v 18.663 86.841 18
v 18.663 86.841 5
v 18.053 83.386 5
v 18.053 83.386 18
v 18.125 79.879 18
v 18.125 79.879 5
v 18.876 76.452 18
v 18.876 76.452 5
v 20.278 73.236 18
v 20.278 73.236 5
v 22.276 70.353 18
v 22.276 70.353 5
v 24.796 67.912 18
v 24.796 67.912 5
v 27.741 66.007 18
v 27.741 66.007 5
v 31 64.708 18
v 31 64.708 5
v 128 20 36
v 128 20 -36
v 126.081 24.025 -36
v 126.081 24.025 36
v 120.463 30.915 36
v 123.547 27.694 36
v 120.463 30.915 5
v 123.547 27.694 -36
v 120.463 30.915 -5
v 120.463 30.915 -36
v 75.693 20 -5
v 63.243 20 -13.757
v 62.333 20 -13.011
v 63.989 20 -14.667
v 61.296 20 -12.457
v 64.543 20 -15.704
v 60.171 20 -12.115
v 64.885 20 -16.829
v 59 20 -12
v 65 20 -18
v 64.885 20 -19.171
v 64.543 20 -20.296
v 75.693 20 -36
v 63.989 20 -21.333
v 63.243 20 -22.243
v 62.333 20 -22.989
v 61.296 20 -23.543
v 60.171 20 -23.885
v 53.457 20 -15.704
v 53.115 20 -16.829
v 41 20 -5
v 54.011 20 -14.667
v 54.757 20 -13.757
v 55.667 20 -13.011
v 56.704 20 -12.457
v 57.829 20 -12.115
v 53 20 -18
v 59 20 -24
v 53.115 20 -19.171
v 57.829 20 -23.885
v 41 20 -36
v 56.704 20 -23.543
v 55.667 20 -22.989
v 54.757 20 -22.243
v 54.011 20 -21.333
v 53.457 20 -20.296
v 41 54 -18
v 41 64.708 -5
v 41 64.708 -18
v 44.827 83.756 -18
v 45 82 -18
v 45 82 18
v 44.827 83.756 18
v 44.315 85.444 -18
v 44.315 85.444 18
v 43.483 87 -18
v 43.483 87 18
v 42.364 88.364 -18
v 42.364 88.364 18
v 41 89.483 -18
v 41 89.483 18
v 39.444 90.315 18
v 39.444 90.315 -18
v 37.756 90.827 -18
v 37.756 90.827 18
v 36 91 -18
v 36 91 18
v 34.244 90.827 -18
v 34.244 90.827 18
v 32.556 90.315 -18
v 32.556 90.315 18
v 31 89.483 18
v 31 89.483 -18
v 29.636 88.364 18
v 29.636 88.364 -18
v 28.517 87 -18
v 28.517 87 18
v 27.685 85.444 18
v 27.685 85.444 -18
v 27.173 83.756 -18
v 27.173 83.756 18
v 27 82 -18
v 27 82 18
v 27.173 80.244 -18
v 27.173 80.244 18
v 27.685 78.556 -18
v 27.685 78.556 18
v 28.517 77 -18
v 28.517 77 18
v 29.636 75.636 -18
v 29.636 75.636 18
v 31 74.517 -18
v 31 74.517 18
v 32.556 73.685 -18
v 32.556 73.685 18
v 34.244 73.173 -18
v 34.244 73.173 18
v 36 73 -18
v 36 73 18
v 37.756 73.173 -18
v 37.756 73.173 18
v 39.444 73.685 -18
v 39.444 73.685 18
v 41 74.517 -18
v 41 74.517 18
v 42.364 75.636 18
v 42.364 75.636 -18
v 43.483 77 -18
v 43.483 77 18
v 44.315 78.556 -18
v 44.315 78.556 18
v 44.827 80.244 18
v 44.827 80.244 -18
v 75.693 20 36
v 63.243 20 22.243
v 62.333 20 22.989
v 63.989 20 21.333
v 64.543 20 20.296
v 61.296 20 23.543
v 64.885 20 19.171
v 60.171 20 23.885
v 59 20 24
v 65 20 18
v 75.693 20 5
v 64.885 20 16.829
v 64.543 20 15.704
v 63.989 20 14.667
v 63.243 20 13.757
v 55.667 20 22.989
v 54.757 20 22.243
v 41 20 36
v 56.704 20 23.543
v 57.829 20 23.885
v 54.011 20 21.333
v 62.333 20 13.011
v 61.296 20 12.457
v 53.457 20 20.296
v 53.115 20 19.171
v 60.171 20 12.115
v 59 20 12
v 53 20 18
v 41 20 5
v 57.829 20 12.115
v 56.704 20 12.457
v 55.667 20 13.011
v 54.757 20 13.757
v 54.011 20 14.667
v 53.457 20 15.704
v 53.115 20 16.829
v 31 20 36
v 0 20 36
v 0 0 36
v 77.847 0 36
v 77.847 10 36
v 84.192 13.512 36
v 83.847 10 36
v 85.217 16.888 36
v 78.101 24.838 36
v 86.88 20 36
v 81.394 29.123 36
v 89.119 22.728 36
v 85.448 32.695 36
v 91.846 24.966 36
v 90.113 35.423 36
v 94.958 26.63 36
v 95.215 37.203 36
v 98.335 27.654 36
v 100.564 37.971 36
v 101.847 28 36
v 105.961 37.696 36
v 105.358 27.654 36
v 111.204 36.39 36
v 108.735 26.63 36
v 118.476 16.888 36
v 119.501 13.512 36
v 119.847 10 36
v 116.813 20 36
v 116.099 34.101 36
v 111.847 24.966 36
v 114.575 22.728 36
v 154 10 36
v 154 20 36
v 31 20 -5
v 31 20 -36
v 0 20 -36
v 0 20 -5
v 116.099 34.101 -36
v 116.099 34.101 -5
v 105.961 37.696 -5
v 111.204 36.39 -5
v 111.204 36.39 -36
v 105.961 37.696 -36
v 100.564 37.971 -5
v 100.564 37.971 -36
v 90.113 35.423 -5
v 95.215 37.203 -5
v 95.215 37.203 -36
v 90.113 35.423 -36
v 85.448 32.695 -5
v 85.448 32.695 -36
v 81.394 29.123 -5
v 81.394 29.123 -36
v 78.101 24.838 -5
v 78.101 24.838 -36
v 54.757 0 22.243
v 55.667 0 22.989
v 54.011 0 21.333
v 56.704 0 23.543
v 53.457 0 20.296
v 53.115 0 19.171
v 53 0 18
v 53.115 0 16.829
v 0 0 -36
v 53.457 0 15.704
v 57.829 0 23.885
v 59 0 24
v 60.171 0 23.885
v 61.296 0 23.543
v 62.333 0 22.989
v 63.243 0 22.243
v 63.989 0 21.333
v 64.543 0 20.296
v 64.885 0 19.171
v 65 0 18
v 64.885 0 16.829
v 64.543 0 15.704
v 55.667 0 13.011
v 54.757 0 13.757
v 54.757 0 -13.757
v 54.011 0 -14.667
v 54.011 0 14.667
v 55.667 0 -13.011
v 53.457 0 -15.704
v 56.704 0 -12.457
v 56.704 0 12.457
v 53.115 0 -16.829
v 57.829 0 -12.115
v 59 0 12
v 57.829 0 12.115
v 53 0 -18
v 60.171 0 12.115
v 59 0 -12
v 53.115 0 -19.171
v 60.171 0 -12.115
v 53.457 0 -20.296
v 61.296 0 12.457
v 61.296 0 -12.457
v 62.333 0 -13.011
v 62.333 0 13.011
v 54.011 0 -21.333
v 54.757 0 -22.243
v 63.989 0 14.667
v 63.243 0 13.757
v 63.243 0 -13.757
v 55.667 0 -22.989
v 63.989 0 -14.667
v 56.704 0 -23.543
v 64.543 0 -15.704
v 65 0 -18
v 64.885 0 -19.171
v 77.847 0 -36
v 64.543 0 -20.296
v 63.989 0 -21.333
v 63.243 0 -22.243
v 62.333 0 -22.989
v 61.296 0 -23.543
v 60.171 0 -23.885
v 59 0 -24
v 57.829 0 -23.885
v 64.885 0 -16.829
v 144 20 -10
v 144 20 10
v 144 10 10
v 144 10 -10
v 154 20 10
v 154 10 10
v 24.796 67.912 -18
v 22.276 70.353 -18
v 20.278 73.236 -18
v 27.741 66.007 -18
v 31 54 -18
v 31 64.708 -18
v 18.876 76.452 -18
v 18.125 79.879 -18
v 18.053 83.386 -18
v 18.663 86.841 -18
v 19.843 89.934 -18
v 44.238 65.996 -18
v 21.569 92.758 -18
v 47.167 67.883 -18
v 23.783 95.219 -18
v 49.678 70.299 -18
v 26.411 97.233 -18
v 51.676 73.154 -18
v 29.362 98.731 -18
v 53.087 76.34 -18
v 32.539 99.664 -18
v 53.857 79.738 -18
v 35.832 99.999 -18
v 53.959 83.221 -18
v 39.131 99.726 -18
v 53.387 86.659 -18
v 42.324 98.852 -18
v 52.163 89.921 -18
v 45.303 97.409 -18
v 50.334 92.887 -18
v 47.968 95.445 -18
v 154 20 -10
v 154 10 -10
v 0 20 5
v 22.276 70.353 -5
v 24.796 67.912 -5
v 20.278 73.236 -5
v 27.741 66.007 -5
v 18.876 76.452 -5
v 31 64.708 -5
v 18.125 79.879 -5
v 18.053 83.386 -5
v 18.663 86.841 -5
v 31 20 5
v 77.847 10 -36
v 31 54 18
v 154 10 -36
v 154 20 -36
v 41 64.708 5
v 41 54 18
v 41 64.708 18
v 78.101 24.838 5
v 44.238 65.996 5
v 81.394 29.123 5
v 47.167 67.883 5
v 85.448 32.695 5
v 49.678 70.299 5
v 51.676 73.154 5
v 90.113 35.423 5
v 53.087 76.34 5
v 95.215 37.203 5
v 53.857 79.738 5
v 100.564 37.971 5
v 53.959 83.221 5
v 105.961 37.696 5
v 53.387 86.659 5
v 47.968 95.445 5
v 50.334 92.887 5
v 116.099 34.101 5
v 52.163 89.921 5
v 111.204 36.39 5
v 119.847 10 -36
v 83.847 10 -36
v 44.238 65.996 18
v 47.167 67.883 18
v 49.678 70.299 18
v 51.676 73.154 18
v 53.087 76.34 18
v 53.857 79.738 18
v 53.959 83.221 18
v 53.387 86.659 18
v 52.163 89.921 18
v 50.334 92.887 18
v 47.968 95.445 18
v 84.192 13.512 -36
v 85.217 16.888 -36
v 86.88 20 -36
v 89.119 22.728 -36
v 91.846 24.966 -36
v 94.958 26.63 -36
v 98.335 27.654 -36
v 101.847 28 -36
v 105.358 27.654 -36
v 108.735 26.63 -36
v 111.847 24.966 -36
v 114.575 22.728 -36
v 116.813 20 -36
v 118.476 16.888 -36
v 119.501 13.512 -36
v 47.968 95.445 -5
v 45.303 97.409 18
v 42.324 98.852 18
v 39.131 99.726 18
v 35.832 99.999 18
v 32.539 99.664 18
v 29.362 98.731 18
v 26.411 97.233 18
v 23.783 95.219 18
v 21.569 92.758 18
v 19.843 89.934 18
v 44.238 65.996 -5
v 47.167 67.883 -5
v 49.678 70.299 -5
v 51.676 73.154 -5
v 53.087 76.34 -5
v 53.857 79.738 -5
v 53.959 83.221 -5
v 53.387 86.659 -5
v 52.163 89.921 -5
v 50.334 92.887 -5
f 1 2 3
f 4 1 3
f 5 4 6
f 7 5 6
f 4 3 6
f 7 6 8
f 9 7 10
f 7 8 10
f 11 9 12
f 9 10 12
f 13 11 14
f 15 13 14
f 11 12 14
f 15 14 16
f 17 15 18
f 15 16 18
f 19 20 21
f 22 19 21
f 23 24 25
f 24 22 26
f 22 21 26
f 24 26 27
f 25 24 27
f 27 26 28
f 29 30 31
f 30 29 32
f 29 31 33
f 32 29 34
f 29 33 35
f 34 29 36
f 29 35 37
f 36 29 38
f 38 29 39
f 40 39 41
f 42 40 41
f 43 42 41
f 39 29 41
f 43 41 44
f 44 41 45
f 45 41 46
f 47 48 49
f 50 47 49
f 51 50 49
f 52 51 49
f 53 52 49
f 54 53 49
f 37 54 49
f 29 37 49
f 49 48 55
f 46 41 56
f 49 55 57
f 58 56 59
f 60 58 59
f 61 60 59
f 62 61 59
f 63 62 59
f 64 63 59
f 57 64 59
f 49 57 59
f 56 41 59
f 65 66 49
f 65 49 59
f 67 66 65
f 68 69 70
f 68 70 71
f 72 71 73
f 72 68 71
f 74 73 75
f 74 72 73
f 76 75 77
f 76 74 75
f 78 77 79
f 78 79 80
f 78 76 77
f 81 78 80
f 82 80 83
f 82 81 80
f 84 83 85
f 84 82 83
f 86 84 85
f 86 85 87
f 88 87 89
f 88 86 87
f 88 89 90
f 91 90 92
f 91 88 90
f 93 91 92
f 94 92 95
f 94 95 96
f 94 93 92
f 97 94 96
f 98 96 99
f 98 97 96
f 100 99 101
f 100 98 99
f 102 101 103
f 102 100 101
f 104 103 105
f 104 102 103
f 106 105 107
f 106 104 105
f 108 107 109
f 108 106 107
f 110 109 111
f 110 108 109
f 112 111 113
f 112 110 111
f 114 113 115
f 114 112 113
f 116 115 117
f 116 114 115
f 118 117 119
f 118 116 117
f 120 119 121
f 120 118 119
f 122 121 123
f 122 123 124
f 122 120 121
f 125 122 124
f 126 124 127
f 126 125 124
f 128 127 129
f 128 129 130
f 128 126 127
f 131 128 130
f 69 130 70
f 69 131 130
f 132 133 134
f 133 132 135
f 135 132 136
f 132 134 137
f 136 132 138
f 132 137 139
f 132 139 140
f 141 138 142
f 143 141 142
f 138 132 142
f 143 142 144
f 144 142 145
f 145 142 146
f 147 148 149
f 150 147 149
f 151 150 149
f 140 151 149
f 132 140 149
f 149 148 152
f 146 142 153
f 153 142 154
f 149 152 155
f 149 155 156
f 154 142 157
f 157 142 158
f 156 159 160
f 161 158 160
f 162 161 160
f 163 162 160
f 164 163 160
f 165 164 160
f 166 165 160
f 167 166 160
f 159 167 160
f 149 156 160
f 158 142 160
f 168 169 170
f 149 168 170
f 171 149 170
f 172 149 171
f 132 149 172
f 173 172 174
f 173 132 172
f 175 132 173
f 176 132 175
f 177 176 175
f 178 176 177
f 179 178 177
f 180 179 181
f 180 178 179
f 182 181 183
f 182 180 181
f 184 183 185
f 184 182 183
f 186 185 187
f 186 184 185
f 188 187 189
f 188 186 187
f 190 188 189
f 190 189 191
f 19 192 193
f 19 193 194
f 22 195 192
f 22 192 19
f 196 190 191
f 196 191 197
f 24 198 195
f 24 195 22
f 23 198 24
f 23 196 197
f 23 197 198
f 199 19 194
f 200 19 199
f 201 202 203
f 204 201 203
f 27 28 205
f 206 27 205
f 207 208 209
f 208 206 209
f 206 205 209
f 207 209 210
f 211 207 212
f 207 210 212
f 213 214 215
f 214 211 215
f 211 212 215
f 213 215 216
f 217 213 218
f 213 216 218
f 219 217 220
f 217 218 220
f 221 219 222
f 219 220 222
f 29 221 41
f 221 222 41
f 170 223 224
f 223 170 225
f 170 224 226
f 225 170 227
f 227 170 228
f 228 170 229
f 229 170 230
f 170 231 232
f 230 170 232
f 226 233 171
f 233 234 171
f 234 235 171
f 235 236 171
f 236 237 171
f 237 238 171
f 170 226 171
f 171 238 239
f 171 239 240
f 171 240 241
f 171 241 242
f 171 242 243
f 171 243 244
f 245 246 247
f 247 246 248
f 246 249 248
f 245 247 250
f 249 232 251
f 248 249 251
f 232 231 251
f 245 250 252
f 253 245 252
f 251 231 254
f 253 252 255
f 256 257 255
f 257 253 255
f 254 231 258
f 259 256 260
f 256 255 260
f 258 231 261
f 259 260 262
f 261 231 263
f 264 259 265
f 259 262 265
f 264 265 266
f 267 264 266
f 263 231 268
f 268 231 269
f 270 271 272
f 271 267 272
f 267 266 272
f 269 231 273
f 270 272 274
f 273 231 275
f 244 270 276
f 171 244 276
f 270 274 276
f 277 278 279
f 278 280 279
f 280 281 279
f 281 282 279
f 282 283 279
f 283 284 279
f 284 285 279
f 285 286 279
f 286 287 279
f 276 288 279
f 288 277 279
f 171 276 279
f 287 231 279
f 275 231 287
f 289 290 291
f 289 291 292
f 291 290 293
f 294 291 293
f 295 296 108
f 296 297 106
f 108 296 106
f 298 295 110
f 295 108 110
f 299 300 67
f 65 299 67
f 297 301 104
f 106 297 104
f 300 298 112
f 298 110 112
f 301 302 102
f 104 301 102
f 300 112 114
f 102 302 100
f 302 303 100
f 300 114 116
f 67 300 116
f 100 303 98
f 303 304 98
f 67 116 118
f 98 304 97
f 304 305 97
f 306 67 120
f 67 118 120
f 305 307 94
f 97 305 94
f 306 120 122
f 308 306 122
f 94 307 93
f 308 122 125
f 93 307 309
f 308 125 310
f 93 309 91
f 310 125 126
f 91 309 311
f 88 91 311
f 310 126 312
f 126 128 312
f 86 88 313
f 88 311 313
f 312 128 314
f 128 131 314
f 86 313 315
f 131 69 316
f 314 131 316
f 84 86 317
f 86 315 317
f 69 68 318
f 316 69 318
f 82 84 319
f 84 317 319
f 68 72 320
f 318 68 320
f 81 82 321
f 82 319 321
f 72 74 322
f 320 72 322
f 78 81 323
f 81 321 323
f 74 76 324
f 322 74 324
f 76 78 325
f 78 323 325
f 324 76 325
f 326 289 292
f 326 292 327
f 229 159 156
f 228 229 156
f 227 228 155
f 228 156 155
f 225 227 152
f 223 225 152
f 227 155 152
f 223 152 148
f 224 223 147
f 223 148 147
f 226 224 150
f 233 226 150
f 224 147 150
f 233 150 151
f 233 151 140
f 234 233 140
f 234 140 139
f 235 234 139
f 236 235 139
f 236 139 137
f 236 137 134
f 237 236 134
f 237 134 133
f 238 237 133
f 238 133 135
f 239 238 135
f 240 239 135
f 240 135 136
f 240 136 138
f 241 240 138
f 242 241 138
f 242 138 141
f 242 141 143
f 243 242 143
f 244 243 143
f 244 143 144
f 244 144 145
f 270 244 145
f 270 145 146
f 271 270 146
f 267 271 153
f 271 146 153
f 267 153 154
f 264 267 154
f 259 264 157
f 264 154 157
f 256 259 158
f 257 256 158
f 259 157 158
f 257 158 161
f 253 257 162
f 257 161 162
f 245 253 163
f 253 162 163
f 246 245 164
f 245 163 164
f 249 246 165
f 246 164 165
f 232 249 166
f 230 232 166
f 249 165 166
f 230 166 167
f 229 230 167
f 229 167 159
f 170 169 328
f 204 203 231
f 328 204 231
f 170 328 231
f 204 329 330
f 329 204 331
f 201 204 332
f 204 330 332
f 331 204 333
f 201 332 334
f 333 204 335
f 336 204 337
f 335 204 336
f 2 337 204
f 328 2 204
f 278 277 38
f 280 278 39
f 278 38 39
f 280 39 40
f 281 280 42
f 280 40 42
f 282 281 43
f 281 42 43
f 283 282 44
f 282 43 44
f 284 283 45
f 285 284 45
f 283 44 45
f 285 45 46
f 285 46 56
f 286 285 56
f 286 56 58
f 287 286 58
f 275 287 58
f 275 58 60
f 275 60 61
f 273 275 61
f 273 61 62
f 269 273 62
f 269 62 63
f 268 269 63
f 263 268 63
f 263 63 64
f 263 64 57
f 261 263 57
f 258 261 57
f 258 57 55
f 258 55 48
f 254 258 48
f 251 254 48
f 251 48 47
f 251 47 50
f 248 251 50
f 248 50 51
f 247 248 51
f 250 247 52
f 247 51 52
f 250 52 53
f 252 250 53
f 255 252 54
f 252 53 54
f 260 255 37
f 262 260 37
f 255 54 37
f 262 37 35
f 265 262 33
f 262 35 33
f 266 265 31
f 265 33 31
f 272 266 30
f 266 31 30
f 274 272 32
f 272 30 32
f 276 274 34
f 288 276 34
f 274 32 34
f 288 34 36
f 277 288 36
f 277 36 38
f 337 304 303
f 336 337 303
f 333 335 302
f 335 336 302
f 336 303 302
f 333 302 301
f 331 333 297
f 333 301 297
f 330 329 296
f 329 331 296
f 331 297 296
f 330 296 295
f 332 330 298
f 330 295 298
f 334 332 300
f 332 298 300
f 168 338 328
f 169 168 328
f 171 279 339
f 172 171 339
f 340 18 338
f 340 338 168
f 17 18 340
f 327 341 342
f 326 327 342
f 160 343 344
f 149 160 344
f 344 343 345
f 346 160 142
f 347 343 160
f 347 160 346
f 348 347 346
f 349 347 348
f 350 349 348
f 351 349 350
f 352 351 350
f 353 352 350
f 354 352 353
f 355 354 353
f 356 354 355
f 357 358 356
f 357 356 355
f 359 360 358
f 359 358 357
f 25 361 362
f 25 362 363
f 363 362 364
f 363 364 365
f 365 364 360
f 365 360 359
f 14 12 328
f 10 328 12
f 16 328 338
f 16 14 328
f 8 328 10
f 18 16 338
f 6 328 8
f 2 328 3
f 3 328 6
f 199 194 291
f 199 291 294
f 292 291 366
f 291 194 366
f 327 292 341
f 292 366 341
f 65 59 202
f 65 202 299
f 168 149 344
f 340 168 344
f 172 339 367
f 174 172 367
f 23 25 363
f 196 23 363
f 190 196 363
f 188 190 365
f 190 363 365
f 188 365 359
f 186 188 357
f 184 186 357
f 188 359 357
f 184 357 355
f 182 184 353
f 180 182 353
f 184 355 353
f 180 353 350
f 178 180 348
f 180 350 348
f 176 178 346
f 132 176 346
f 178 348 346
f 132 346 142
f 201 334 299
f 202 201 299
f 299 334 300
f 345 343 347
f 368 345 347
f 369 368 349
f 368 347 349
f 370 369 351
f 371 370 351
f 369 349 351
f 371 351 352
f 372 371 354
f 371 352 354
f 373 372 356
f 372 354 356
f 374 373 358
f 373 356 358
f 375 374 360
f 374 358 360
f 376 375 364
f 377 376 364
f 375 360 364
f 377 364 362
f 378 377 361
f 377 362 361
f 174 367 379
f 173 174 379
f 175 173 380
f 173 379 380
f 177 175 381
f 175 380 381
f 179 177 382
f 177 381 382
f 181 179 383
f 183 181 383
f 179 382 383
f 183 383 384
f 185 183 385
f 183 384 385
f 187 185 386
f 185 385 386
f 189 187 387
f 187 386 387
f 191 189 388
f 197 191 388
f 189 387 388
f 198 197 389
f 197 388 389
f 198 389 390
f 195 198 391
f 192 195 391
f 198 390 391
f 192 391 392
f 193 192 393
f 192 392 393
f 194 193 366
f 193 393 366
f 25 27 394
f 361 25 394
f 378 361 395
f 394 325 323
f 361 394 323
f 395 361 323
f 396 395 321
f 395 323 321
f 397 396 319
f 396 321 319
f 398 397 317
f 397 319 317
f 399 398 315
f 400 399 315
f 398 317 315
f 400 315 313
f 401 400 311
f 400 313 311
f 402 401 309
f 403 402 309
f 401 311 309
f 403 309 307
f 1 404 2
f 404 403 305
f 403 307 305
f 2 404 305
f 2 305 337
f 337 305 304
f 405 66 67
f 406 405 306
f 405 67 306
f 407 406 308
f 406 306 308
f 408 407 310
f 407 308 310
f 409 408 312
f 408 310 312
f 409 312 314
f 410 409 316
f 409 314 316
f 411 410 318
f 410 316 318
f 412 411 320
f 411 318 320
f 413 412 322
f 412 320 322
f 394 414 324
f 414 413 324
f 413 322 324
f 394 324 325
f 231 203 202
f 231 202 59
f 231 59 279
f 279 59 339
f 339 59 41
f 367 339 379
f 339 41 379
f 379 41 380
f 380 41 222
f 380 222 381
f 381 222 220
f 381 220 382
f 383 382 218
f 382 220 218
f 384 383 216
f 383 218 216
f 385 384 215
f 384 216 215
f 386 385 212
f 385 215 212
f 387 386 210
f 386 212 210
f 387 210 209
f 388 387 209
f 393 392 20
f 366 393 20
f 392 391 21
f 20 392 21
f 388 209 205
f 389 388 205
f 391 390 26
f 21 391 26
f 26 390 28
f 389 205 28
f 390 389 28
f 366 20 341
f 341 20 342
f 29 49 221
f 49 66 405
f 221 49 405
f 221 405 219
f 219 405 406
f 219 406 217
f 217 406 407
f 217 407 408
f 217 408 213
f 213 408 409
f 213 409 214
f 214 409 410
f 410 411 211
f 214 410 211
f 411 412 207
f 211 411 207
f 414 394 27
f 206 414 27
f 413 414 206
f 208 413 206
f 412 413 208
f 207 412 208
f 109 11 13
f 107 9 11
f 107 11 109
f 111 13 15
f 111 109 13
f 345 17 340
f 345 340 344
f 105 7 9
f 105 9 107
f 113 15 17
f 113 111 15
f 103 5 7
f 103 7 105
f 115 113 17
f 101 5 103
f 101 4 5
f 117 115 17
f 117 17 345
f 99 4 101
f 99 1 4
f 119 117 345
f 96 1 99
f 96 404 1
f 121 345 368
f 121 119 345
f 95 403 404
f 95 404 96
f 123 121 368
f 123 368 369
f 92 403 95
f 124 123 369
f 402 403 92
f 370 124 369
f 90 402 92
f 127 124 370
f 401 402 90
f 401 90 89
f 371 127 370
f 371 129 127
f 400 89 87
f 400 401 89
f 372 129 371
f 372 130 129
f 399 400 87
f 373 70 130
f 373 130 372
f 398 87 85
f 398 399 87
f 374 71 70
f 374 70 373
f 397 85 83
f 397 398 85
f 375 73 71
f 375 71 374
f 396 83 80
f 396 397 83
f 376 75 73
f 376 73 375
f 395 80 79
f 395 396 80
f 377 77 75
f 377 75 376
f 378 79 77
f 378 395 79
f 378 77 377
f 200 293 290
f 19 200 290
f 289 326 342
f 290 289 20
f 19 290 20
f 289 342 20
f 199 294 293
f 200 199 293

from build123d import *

# Parameters (mm, degrees)
BOSS_EXTRUDE1_DEPTH      = 36
BOSS_EXTRUDE1_DEPTH_BACK = 36
BOSS_EXTRUDE2_DEPTH      = 18
BOSS_EXTRUDE2_DEPTH_BACK = 18
SKETCH2_3_R              = 9
BOSS_EXTRUDE3_DEPTH      = 5
BOSS_EXTRUDE3_DEPTH_BACK = 5
SKETCH2_4_W              = 5
SKETCH2_4_H              = 34
SKETCH3_W                = 10
SKETCH3_H                = 20
CUT_EXTRUDE1_DEPTH       = 178.234308191
RIB1_START               = -5
RIB1_DEPTH               = 10
SKETCH5_R                = 6
CUT_EXTRUDE2_DEPTH       = 178.234308191


# Read off the part's stored shape, not the designer's step: Rib1
with BuildPart() as part:
    # Sketch2 → Boss-Extrude1 (new, two sides: drawn at the far end of the back side and taken through both)
    with BuildSketch(Plane.XY.offset(-BOSS_EXTRUDE1_DEPTH_BACK)):
        with BuildLine():
            Line((0, 20), (0, 0))
            Line((0, 0), (77.846606339, 0))
            Line((77.846606339, 0), (77.846606339, 10))
            Line((77.846606339, 10), (83.846606339, 10))
            ThreePointArc((83.846606339, 10), (101.846606339, 28), (119.846606339, 10))
            Line((119.846606339, 10), (154, 10))
            Line((154, 10), (154, 20))
            Line((154, 20), (128, 20))
            ThreePointArc((128, 20), (124.887273582, 25.909985951), (120.463315732, 30.914543538))
            ThreePointArc((120.463315732, 30.914543538), (95.214697292, 37.203267863), (75.693212678, 20))
            Line((75.693212678, 20), (41, 20))
            Line((41, 20), (31, 20))
            Line((31, 20), (0, 20))
        make_face()
    extrude(amount=BOSS_EXTRUDE1_DEPTH + BOSS_EXTRUDE1_DEPTH_BACK)



with BuildPart() as body_2:
    # Sketch2<3> → Boss-Extrude2 (new, two sides: drawn at the far end of the back side and taken through both)
    with BuildSketch(Plane.XY.offset(-BOSS_EXTRUDE2_DEPTH_BACK)):
        with BuildLine():
            ThreePointArc((47.96788461, 95.445063703), (30.929004292, 99.270929405), (18.663131241, 86.840762505))
            ThreePointArc((18.663131241, 86.840762505), (20.277580459, 73.236123929), (31, 64.708383534))
            Line((31, 64.708383534), (31, 54))
            Line((31, 54), (41, 54))
            Line((41, 54), (41, 64.708383534))
            ThreePointArc((41, 64.708383534), (53.55457644, 78.020446505), (47.96788461, 95.445063703))
        make_face()
        with Locations((36, 82)):
            Circle(SKETCH2_3_R, mode=Mode.SUBTRACT)
    extrude(amount=BOSS_EXTRUDE2_DEPTH + BOSS_EXTRUDE2_DEPTH_BACK)


with BuildPart() as part_1:
    add(part.part)

    add(body_2.part)  # Boss-Extrude3 merges body 2
    # Sketch2<4> → Boss-Extrude3 (add, two sides: drawn at the far end of the back side and taken through both)
    with BuildSketch(Plane.XY.offset(-BOSS_EXTRUDE3_DEPTH_BACK)):
        with BuildLine():
            Line((120.463315732, 30.914543538), (47.96788461, 95.445063703))
            ThreePointArc((47.96788461, 95.445063703), (53.55457644, 78.020446505), (41, 64.708383534))
            Line((41, 64.708383534), (41, 54))
            Line((41, 54), (41, 20))
            Line((41, 20), (75.693212678, 20))
            ThreePointArc((75.693212678, 20), (95.214697292, 37.203267863), (120.463315732, 30.914543538))
        make_face()
        with Locations((33.5, 37)):
            Rectangle(SKETCH2_4_W, SKETCH2_4_H)
        with Locations((38.5, 37)):
            Rectangle(SKETCH2_4_W, SKETCH2_4_H)
        with BuildLine():
            Line((18.663131241, 86.840762505), (0, 20))
            Line((0, 20), (31, 20))
            Line((31, 20), (31, 54))
            Line((31, 54), (31, 64.708383534))
            ThreePointArc((31, 64.708383534), (20.277580459, 73.236123929), (18.663131241, 86.840762505))
        make_face()
    extrude(amount=BOSS_EXTRUDE3_DEPTH + BOSS_EXTRUDE3_DEPTH_BACK)

    # Sketch3 → Cut-Extrude1 (cut, through all)
    with BuildSketch(Plane(origin=(0, 20, 0), x_dir=(1, 0, 0), z_dir=(0, 1, 0))):
        with Locations((149, 0)):
            Rectangle(SKETCH3_W, SKETCH3_H)
    extrude(amount=-CUT_EXTRUDE1_DEPTH, mode=Mode.SUBTRACT)

    # Rib1 outline → Rib1 (add)
    with BuildSketch(Plane.ZY.offset(-36).offset(RIB1_START)):
        Polygon((36, 20), (18, 54), (5, 54), (5, 20), align=None)
    rib1 = extrude(amount=RIB1_DEPTH)

    # Mirror1: Rib1 across plane
    add(rib1.mirror(Plane.XY))

    # Sketch5 → Cut-Extrude2 (cut, through all)
    with BuildSketch(Plane(origin=(0, 20, 0), x_dir=(1, 0, 0), z_dir=(0, 1, 0))):
        with Locations(Location((59, -18, 0), (0, 0, 180))):
            Circle(SKETCH5_R)
        with Locations((59, 18)):
            Circle(SKETCH5_R)
    extrude(amount=-CUT_EXTRUDE2_DEPTH, mode=Mode.SUBTRACT)


solid = part_1.part
